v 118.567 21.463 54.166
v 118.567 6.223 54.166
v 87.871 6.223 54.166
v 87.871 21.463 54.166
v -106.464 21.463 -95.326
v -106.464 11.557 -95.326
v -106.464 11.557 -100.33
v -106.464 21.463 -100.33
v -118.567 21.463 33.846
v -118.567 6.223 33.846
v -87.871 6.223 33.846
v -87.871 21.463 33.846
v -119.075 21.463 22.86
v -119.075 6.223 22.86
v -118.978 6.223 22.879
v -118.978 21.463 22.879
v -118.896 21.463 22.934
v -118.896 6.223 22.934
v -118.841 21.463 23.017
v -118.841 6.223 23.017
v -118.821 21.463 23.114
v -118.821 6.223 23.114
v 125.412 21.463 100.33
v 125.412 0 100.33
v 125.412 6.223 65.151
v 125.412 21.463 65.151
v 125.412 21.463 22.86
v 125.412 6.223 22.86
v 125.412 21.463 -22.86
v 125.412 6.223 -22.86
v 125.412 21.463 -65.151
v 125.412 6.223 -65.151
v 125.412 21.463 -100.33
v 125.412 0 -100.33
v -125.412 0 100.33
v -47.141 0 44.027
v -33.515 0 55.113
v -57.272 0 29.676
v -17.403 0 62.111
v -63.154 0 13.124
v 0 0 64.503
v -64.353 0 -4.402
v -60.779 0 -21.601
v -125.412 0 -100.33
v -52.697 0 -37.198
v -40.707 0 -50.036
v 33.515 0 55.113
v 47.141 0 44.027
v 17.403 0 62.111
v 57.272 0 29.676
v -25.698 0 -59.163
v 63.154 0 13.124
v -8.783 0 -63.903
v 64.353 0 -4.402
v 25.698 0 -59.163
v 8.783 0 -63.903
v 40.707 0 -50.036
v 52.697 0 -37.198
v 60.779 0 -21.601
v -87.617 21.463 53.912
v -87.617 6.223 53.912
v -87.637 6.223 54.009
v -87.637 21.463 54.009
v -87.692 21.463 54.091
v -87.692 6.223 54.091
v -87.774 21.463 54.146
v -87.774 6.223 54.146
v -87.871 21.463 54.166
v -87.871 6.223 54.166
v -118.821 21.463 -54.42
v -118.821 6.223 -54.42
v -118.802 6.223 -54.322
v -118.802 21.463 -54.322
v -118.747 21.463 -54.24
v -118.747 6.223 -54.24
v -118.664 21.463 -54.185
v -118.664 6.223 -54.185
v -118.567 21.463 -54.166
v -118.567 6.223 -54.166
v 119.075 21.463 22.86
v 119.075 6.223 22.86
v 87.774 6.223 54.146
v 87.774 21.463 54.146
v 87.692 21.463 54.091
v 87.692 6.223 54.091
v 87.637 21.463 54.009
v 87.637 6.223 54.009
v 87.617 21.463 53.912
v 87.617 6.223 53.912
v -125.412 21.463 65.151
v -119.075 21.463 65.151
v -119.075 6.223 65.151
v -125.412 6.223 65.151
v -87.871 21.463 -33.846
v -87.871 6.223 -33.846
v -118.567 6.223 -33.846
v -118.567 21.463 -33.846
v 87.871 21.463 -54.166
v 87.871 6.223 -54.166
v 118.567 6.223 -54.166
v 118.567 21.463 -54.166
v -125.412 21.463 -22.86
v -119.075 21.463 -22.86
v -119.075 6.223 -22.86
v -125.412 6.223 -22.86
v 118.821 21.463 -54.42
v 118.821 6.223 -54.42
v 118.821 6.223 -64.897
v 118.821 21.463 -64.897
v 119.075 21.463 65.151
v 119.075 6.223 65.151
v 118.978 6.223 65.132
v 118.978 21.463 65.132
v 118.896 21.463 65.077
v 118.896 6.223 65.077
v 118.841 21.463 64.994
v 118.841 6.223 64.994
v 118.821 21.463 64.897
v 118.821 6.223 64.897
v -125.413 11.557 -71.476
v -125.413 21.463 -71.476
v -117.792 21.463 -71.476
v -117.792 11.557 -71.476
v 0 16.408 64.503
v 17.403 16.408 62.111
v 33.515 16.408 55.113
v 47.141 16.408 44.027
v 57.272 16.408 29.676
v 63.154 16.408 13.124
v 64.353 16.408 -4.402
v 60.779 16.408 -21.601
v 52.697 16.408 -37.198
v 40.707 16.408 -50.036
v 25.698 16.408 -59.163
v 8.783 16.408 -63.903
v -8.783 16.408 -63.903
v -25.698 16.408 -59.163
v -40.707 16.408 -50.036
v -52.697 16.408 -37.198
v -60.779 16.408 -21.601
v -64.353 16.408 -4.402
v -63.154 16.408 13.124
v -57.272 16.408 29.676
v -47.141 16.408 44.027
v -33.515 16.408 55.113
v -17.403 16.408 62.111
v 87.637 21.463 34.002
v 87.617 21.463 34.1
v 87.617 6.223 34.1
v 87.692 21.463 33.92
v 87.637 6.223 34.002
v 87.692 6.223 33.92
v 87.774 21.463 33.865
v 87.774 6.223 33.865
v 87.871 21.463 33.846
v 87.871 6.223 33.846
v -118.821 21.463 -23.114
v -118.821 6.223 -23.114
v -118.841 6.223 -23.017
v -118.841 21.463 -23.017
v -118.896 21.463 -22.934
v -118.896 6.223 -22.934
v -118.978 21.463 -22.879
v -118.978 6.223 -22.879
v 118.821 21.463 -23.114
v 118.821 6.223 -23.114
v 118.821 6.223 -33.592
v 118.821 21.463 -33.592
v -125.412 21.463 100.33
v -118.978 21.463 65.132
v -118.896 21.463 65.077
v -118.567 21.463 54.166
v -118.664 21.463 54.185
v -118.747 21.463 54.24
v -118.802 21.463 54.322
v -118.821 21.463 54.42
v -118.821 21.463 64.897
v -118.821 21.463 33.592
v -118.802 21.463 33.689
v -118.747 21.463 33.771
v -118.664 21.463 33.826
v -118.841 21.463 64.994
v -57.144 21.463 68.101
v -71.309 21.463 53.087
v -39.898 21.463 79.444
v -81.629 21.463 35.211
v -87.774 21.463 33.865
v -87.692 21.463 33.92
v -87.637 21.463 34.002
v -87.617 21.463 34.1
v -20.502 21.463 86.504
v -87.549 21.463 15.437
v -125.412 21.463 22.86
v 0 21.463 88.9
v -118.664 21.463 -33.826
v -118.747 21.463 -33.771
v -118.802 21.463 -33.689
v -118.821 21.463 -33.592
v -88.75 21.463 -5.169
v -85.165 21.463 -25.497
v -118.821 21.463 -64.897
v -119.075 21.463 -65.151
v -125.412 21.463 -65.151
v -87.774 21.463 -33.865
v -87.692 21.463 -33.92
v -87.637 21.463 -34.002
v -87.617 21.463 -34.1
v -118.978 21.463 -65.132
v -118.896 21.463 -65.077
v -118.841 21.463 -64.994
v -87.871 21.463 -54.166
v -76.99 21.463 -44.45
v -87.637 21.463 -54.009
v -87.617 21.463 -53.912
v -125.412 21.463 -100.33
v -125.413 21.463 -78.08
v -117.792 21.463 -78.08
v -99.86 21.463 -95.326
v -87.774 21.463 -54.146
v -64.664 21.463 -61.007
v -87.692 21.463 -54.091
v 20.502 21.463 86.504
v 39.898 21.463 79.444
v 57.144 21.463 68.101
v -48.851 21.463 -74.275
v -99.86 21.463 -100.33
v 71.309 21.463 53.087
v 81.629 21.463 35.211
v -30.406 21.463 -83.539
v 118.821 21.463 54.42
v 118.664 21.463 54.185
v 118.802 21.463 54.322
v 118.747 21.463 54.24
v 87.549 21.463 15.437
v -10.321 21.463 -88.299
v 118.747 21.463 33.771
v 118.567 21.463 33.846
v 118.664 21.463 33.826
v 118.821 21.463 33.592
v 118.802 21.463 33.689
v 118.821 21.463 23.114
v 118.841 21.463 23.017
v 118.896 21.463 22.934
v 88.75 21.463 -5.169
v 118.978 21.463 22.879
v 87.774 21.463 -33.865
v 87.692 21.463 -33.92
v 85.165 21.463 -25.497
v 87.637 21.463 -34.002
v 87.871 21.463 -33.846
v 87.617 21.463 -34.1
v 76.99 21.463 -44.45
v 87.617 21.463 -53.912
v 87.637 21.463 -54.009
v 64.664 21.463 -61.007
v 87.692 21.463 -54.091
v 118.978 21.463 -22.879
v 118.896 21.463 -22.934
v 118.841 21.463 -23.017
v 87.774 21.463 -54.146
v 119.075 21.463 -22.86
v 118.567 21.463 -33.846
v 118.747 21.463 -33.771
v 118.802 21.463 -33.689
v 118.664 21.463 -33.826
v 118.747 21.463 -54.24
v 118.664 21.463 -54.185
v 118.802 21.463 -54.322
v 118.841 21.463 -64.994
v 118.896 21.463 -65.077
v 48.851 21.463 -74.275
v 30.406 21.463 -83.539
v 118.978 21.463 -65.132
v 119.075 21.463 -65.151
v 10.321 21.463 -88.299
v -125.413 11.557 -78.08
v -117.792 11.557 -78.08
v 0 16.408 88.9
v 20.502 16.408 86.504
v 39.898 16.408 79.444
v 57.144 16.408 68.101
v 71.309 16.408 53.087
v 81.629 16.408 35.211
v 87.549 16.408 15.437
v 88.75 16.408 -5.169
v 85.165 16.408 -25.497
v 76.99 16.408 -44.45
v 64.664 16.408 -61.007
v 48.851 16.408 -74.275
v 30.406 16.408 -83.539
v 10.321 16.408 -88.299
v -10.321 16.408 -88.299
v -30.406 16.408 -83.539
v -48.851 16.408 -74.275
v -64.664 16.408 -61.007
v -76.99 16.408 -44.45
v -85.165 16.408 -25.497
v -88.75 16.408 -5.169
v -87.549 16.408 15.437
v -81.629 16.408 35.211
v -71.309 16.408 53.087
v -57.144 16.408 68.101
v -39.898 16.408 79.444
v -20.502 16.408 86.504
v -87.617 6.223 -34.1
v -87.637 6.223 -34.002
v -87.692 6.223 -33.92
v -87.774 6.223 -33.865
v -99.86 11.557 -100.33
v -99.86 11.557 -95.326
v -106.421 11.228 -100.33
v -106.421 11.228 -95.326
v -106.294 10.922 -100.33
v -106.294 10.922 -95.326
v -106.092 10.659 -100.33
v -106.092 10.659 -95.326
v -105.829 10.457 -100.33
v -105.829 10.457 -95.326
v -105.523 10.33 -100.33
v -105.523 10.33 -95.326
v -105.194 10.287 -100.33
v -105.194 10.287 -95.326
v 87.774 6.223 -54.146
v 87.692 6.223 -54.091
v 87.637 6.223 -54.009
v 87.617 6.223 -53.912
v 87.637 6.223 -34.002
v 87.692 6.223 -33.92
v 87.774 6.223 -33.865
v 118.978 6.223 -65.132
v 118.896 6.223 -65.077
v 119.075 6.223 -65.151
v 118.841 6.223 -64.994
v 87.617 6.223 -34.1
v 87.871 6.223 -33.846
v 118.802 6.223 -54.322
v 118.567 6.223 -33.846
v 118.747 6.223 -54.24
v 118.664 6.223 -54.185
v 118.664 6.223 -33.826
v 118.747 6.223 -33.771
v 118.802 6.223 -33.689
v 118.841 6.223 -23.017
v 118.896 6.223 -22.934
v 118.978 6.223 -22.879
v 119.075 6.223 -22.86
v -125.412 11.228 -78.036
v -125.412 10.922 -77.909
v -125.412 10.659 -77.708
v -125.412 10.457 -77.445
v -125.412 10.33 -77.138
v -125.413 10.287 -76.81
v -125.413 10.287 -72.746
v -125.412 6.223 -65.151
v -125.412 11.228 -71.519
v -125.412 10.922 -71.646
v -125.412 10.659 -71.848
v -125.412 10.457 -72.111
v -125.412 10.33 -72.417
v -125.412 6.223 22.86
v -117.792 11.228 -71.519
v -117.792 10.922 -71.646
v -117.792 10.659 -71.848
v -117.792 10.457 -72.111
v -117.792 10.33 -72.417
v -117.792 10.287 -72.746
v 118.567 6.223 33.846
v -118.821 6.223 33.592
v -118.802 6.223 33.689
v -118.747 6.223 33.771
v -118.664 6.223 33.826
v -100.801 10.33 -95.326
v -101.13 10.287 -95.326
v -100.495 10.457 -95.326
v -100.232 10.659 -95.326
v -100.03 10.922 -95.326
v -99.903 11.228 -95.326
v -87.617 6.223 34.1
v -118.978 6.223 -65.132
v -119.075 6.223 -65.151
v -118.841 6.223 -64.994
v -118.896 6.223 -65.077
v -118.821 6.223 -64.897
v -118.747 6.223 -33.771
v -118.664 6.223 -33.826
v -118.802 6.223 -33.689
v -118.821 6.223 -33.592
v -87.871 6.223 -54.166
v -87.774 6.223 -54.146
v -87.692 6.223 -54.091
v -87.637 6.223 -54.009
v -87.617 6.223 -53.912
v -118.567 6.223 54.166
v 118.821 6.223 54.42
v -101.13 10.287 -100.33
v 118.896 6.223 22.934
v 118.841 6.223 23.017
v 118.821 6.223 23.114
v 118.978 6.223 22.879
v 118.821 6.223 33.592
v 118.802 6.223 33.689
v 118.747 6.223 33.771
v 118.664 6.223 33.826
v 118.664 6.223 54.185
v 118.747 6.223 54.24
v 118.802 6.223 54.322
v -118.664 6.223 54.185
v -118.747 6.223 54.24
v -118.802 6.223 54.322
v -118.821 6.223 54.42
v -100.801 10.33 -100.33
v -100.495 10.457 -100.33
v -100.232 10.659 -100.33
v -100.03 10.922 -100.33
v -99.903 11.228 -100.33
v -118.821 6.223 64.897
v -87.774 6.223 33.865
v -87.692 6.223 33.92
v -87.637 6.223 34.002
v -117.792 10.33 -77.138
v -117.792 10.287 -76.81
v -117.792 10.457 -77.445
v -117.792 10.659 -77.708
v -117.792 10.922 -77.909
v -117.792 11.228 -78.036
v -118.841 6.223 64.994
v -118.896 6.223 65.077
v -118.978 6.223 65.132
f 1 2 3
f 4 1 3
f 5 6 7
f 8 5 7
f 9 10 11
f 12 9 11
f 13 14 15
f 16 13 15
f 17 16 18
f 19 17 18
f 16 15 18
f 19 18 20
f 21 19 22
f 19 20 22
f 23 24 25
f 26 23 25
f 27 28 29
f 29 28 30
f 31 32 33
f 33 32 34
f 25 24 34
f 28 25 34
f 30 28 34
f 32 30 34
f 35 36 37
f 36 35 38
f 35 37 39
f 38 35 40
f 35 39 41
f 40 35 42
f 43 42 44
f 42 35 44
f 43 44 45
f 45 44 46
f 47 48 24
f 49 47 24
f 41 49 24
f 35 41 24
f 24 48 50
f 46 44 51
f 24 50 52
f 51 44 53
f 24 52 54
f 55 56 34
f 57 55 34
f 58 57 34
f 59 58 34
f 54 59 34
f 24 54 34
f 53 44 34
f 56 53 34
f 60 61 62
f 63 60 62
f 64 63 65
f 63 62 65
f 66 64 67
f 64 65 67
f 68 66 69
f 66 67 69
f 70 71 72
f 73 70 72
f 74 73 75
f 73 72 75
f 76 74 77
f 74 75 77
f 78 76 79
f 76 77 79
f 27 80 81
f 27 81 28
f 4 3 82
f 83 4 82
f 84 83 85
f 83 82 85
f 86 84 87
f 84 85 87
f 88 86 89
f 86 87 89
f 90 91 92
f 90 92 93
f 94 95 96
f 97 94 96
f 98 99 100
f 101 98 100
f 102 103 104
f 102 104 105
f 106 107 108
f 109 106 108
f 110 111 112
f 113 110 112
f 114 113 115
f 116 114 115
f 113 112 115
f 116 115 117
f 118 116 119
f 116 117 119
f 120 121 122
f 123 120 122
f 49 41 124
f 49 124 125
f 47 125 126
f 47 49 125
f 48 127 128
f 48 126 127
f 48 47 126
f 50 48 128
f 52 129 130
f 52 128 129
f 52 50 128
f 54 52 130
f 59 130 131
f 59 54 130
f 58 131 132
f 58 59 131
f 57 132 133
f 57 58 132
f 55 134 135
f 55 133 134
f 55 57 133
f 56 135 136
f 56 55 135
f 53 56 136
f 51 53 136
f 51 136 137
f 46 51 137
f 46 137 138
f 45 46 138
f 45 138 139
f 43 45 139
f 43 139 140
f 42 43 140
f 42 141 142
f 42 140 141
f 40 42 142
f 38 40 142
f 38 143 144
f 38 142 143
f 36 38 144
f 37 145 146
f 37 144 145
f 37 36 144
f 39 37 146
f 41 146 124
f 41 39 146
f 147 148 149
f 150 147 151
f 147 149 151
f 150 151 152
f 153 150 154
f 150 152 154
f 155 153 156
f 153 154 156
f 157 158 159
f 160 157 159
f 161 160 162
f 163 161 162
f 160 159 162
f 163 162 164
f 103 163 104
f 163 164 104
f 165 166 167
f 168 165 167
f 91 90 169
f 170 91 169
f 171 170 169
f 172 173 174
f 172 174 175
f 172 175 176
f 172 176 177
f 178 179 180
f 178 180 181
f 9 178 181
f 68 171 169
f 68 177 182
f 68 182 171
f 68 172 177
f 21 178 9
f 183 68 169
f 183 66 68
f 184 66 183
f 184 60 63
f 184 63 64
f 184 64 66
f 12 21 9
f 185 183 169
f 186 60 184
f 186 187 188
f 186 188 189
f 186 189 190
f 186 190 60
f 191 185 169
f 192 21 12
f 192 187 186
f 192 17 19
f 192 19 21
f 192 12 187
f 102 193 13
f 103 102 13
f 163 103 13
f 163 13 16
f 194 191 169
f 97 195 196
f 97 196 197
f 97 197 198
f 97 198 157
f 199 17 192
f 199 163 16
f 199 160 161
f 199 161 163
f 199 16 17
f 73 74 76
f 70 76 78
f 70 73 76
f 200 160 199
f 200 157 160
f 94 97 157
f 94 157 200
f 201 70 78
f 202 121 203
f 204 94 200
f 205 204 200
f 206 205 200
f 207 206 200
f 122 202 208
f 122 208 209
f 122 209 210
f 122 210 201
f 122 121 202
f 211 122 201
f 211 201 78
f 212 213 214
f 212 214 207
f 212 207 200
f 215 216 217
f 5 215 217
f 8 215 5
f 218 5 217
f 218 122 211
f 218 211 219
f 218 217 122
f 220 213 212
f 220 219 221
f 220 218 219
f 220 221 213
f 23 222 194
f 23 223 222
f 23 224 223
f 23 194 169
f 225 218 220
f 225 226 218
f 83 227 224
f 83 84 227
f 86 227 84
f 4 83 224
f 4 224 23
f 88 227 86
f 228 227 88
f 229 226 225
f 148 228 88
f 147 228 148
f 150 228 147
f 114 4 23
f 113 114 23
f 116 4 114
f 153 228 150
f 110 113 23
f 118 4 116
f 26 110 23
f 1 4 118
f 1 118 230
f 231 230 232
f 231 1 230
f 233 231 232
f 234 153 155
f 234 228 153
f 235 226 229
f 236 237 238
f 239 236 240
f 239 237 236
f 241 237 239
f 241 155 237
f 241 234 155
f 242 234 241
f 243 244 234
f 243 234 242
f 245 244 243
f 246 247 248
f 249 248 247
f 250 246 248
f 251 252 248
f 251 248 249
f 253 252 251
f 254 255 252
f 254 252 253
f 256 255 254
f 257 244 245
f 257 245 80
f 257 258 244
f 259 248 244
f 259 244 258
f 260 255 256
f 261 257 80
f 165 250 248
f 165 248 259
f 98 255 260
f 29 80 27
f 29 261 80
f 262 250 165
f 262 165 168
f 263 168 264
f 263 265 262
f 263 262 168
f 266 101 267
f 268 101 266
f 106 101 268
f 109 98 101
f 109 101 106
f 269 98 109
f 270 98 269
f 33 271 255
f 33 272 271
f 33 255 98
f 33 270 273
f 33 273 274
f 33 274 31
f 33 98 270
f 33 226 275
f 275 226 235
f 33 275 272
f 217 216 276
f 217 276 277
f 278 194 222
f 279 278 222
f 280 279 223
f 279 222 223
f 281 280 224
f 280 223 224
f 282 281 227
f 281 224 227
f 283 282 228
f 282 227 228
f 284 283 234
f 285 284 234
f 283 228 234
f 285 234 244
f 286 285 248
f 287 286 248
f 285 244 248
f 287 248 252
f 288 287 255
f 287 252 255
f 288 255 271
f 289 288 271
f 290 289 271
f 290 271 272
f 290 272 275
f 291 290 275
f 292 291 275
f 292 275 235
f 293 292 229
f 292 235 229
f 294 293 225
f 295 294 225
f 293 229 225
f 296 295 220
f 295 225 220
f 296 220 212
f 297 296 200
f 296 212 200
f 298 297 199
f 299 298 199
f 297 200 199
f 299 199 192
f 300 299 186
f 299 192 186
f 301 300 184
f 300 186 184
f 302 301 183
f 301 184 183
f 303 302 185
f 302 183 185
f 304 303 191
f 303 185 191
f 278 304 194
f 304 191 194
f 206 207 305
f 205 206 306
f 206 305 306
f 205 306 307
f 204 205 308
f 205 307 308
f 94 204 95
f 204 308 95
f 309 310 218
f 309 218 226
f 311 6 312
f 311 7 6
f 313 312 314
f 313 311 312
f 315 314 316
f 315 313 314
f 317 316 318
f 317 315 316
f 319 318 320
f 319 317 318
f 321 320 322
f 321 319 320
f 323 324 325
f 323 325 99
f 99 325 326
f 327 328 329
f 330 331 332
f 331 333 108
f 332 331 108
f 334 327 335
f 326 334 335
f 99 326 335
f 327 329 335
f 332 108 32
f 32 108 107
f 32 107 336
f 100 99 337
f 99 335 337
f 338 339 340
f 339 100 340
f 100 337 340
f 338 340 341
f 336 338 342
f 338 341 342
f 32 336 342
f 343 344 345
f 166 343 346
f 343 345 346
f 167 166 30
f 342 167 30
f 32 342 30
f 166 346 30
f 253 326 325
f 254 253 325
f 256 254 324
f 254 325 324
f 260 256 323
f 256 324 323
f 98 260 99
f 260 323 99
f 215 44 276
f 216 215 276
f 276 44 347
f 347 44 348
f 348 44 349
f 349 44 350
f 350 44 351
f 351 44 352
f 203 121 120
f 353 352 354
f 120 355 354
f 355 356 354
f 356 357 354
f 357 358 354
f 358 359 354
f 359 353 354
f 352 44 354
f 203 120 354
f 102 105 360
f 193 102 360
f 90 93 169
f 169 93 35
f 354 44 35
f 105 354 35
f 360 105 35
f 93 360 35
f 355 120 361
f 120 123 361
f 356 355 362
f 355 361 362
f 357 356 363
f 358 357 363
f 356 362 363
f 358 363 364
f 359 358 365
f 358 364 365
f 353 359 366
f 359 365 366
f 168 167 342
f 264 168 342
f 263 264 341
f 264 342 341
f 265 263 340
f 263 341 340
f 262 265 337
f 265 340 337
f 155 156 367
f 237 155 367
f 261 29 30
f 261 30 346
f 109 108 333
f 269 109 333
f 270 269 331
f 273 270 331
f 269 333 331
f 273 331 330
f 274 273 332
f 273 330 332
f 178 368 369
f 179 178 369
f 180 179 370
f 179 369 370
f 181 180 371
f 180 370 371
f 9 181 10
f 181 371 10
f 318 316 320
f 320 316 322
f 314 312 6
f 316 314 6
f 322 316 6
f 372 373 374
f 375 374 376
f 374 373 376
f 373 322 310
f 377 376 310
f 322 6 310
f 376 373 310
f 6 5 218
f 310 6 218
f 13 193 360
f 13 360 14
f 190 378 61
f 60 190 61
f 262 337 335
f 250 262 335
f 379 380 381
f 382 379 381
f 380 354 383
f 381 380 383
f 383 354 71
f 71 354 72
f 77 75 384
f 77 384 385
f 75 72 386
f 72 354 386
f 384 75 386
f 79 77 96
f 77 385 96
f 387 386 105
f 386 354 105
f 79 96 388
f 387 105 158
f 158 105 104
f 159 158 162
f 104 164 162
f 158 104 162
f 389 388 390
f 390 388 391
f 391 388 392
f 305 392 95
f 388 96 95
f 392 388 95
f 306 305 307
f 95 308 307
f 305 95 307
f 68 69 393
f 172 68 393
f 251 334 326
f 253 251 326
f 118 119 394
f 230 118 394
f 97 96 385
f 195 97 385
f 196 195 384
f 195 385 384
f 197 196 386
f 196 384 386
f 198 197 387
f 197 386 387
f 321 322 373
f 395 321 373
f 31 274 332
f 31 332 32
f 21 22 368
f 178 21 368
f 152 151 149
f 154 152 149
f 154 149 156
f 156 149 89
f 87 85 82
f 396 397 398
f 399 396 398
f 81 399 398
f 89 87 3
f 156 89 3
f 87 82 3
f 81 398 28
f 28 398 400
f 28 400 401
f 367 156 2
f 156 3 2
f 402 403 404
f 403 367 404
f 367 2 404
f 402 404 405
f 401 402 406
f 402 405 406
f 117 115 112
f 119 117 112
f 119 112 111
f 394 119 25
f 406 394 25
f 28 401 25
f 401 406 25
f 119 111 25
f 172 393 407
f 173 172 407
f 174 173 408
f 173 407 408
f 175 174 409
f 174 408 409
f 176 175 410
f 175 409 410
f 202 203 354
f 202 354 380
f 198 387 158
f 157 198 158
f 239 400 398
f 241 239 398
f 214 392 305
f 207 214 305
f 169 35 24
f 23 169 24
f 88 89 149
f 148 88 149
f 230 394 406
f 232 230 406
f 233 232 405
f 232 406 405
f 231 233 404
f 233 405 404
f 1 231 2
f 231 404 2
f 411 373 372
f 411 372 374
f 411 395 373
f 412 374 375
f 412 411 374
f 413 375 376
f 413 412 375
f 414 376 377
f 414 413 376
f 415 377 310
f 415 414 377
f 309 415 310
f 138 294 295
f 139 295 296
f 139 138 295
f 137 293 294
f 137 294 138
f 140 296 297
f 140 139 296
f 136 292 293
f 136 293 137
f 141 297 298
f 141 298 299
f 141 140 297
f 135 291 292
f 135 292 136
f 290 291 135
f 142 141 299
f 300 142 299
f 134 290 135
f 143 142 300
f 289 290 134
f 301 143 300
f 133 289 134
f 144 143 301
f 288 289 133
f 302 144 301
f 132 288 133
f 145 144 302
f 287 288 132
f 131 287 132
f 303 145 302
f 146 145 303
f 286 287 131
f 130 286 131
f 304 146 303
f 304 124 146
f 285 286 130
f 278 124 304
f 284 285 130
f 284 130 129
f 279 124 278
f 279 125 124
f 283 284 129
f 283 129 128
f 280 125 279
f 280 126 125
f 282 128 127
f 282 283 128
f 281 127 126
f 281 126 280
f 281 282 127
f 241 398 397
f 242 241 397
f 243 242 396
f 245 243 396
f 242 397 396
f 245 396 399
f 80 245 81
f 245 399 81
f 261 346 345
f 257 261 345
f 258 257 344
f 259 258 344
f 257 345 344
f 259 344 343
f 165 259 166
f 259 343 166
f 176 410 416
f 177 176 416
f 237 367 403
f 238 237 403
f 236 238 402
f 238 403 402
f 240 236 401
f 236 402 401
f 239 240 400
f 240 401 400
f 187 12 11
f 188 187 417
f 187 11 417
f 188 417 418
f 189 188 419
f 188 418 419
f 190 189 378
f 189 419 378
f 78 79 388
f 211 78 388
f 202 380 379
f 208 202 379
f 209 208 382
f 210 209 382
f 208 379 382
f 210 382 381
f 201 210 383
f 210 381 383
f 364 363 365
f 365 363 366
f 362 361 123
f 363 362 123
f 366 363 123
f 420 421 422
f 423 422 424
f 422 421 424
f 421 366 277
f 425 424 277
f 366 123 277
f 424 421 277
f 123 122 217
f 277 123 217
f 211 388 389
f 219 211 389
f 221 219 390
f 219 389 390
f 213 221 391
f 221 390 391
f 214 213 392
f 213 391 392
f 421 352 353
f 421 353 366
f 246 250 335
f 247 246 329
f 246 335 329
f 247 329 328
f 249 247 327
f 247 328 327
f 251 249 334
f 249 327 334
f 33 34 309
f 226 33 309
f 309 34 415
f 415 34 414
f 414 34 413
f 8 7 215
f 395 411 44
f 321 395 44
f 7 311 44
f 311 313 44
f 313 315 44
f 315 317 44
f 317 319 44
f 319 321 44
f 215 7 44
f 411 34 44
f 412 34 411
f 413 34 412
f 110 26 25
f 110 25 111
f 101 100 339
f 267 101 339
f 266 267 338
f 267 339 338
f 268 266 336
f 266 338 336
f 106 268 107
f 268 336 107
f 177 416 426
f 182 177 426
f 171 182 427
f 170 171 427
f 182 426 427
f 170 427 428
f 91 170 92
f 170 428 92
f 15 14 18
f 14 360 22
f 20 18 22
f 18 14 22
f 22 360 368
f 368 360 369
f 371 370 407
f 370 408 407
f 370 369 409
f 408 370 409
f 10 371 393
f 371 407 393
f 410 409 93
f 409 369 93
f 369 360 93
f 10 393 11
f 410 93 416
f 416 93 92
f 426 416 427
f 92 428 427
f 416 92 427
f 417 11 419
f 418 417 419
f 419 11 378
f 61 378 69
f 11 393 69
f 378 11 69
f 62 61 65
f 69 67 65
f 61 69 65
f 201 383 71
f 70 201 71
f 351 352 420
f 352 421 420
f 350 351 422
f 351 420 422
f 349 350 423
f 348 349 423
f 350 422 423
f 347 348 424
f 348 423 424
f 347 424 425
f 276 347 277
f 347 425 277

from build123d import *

# Parameters (mm, degrees)
BOSS_EXTRUDE1_DEPTH     = 21.463
SKETCH3_R               = 88.9
CUT_EXTRUDE1_DEPTH      = 5.0546
CUT_EXTRUDE2_DEPTH      = 162.442372526
CUT_EXTRUDE2_DEPTH_BACK = 162.442372526
SKETCH4_R               = 64.5033
SKETCH5_W               = 250.825
SKETCH5_H               = 200.66
BOSS_EXTRUDE2_DEPTH     = 6.223
CUT_EXTRUDE3_DEPTH      = 162.442372526
CUT_EXTRUDE3_DEPTH_BACK = 162.442372526
SKETCH4_2_R             = 64.5033
SKETCH6_W               = 6.604
SKETCH6_H               = 5.0038
SKETCH6_W_2             = 7.62
SKETCH6_H_2             = 6.604
CUT_EXTRUDE4_DEPTH      = 11.176
FILLET4_R               = 1.27


with BuildPart() as part:
    # Sketch2 → Boss-Extrude1 (new body)
    with BuildSketch(Plane(origin=(0, 0, 0), x_dir=(1, 0, 0), z_dir=(0, 1, 0))):
        with BuildLine():
            Line((-125.4125, 65.151), (-119.0752, 65.151))
            ThreePointArc((-119.0752, 65.151), (-118.895594878, 65.076605122), (-118.8212, 64.897))
            Line((-118.8212, 64.897), (-118.8212, 54.4195))
            ThreePointArc((-118.8212, 54.4195), (-118.746805122, 54.239894878), (-118.5672, 54.1655))
            Line((-118.5672, 54.1655), (-87.8713, 54.1655))
            ThreePointArc((-87.8713, 54.1655), (-87.691694878, 54.091105122), (-87.6173, 53.9115))
            Line((-87.6173, 53.9115), (-87.6173, 34.0995))
            ThreePointArc((-87.6173, 34.0995), (-87.691694878, 33.919894878), (-87.8713, 33.8455))
            Line((-87.8713, 33.8455), (-118.5672, 33.8455))
            ThreePointArc((-118.5672, 33.8455), (-118.746805122, 33.771105122), (-118.8212, 33.5915))
            Line((-118.8212, 33.5915), (-118.8212, 23.114))
            ThreePointArc((-118.8212, 23.114), (-118.895594878, 22.934394878), (-119.0752, 22.86))
            Line((-119.0752, 22.86), (-125.4125, 22.86))
            Line((-125.4125, 22.86), (-125.4125, -22.86))
            Line((-125.4125, -22.86), (-119.0752, -22.86))
            ThreePointArc((-119.0752, -22.86), (-118.895594878, -22.934394878), (-118.8212, -23.114))
            Line((-118.8212, -23.114), (-118.8212, -33.5915))
            ThreePointArc((-118.8212, -33.5915), (-118.746805122, -33.771105122), (-118.5672, -33.8455))
            Line((-118.5672, -33.8455), (-87.8713, -33.8455))
            ThreePointArc((-87.8713, -33.8455), (-87.691694878, -33.919894878), (-87.6173, -34.0995))
            Line((-87.6173, -34.0995), (-87.6173, -53.9115))
            ThreePointArc((-87.6173, -53.9115), (-87.691694878, -54.091105122), (-87.8713, -54.1655))
            Line((-87.8713, -54.1655), (-118.5672, -54.1655))
            ThreePointArc((-118.5672, -54.1655), (-118.746805122, -54.239894878), (-118.8212, -54.4195))
            Line((-118.8212, -54.4195), (-118.8212, -64.897))
            ThreePointArc((-118.8212, -64.897), (-118.895594878, -65.076605122), (-119.0752, -65.151))
            Line((-119.0752, -65.151), (-125.4125, -65.151))
            Line((-125.4125, -65.151), (-125.4125, -100.33))
            Line((-125.4125, -100.33), (125.4125, -100.33))
            Line((125.4125, -100.33), (125.4125, -65.151))
            Line((125.4125, -65.151), (119.0752, -65.151))
            ThreePointArc((119.0752, -65.151), (118.895594878, -65.076605122), (118.8212, -64.897))
            Line((118.8212, -64.897), (118.8212, -54.4195))
            ThreePointArc((118.8212, -54.4195), (118.746805122, -54.239894878), (118.5672, -54.1655))
            Line((118.5672, -54.1655), (87.8713, -54.1655))
            ThreePointArc((87.8713, -54.1655), (87.691694878, -54.091105122), (87.6173, -53.9115))
            Line((87.6173, -53.9115), (87.6173, -34.0995))
            ThreePointArc((87.6173, -34.0995), (87.691694878, -33.919894878), (87.8713, -33.8455))
            Line((87.8713, -33.8455), (118.5672, -33.8455))
            ThreePointArc((118.5672, -33.8455), (118.746805122, -33.771105122), (118.8212, -33.5915))
            Line((118.8212, -33.5915), (118.8212, -23.114))
            ThreePointArc((118.8212, -23.114), (118.895594878, -22.934394878), (119.0752, -22.86))
            Line((119.0752, -22.86), (125.4125, -22.86))
            Line((125.4125, -22.86), (125.4125, 22.86))
            Line((125.4125, 22.86), (119.0752, 22.86))
            ThreePointArc((119.0752, 22.86), (118.895594878, 22.934394878), (118.8212, 23.114))
            Line((118.8212, 23.114), (118.8212, 33.5915))
            ThreePointArc((118.8212, 33.5915), (118.746805122, 33.771105122), (118.5672, 33.8455))
            Line((118.5672, 33.8455), (87.8713, 33.8455))
            ThreePointArc((87.8713, 33.8455), (87.691694878, 33.919894878), (87.6173, 34.0995))
            Line((87.6173, 34.0995), (87.6173, 53.9115))
            ThreePointArc((87.6173, 53.9115), (87.691694878, 54.091105122), (87.8713, 54.1655))
            Line((87.8713, 54.1655), (118.5672, 54.1655))
            ThreePointArc((118.5672, 54.1655), (118.746805122, 54.239894878), (118.8212, 54.4195))
            Line((118.8212, 54.4195), (118.8212, 64.897))
            ThreePointArc((118.8212, 64.897), (118.895594878, 65.076605122), (119.0752, 65.151))
            Line((119.0752, 65.151), (125.4125, 65.151))
            Line((125.4125, 65.151), (125.4125, 100.33))
            Line((125.4125, 100.33), (-125.4125, 100.33))
            Line((-125.4125, 100.33), (-125.4125, 65.151))
        make_face()
    extrude(amount=BOSS_EXTRUDE1_DEPTH)

    # Sketch3 → Cut-Extrude1 (cut)
    with BuildSketch(Plane(origin=(0, 21.463, 0), x_dir=(1, 0, 0), z_dir=(0, 1, 0))):
        Circle(SKETCH3_R)
    extrude(amount=-CUT_EXTRUDE1_DEPTH, mode=Mode.SUBTRACT)

    # Sketch4 → Cut-Extrude2 (cut, two sides: drawn at the far end of the back side and taken through both)
    with BuildSketch(Plane(origin=(0, 16.4084, 0), x_dir=(1, 0, 0), z_dir=(0, 1, 0)).offset(-CUT_EXTRUDE2_DEPTH_BACK)):
        Circle(SKETCH4_R)
    extrude(amount=CUT_EXTRUDE2_DEPTH + CUT_EXTRUDE2_DEPTH_BACK, mode=Mode.SUBTRACT)

    # Sketch5 → Boss-Extrude2 (add)
    with BuildSketch(Plane.XZ):
        Rectangle(SKETCH5_W, SKETCH5_H)
    extrude(amount=-BOSS_EXTRUDE2_DEPTH)

    # Sketch4<2> → Cut-Extrude3 (cut, two sides: drawn at the far end of the back side and taken through both)
    with BuildSketch(Plane(origin=(0, 16.4084, 0), x_dir=(1, 0, 0), z_dir=(0, 1, 0)).offset(-CUT_EXTRUDE3_DEPTH_BACK)):
        Circle(SKETCH4_2_R)
    extrude(amount=CUT_EXTRUDE3_DEPTH + CUT_EXTRUDE3_DEPTH_BACK, mode=Mode.SUBTRACT)

    # Sketch6 → Cut-Extrude4 (cut)
    with BuildSketch(Plane(origin=(0, 21.463, 0), x_dir=(1, 0, 0), z_dir=(0, 1, 0))):
        with Locations((-103.1621, 97.8281)):
            Rectangle(SKETCH6_W, SKETCH6_H)
        with Locations((-121.6025, 74.7776)):
            Rectangle(SKETCH6_W_2, SKETCH6_H_2)
    extrude(amount=-CUT_EXTRUDE4_DEPTH, mode=Mode.SUBTRACT)

    # Fillet4
    fillet4_edges = [part.edges().sort_by_distance(p)[0] for p in [
        (-121.6025, 10.287, -78.0796),
        (-121.6025, 10.287, -71.4756),
        (-99.8601, 10.287, -97.8281),
        (-106.4641, 10.287, -97.8281),
    ]]
    fillet(fillet4_edges, radius=FILLET4_R)


solid = part.part
